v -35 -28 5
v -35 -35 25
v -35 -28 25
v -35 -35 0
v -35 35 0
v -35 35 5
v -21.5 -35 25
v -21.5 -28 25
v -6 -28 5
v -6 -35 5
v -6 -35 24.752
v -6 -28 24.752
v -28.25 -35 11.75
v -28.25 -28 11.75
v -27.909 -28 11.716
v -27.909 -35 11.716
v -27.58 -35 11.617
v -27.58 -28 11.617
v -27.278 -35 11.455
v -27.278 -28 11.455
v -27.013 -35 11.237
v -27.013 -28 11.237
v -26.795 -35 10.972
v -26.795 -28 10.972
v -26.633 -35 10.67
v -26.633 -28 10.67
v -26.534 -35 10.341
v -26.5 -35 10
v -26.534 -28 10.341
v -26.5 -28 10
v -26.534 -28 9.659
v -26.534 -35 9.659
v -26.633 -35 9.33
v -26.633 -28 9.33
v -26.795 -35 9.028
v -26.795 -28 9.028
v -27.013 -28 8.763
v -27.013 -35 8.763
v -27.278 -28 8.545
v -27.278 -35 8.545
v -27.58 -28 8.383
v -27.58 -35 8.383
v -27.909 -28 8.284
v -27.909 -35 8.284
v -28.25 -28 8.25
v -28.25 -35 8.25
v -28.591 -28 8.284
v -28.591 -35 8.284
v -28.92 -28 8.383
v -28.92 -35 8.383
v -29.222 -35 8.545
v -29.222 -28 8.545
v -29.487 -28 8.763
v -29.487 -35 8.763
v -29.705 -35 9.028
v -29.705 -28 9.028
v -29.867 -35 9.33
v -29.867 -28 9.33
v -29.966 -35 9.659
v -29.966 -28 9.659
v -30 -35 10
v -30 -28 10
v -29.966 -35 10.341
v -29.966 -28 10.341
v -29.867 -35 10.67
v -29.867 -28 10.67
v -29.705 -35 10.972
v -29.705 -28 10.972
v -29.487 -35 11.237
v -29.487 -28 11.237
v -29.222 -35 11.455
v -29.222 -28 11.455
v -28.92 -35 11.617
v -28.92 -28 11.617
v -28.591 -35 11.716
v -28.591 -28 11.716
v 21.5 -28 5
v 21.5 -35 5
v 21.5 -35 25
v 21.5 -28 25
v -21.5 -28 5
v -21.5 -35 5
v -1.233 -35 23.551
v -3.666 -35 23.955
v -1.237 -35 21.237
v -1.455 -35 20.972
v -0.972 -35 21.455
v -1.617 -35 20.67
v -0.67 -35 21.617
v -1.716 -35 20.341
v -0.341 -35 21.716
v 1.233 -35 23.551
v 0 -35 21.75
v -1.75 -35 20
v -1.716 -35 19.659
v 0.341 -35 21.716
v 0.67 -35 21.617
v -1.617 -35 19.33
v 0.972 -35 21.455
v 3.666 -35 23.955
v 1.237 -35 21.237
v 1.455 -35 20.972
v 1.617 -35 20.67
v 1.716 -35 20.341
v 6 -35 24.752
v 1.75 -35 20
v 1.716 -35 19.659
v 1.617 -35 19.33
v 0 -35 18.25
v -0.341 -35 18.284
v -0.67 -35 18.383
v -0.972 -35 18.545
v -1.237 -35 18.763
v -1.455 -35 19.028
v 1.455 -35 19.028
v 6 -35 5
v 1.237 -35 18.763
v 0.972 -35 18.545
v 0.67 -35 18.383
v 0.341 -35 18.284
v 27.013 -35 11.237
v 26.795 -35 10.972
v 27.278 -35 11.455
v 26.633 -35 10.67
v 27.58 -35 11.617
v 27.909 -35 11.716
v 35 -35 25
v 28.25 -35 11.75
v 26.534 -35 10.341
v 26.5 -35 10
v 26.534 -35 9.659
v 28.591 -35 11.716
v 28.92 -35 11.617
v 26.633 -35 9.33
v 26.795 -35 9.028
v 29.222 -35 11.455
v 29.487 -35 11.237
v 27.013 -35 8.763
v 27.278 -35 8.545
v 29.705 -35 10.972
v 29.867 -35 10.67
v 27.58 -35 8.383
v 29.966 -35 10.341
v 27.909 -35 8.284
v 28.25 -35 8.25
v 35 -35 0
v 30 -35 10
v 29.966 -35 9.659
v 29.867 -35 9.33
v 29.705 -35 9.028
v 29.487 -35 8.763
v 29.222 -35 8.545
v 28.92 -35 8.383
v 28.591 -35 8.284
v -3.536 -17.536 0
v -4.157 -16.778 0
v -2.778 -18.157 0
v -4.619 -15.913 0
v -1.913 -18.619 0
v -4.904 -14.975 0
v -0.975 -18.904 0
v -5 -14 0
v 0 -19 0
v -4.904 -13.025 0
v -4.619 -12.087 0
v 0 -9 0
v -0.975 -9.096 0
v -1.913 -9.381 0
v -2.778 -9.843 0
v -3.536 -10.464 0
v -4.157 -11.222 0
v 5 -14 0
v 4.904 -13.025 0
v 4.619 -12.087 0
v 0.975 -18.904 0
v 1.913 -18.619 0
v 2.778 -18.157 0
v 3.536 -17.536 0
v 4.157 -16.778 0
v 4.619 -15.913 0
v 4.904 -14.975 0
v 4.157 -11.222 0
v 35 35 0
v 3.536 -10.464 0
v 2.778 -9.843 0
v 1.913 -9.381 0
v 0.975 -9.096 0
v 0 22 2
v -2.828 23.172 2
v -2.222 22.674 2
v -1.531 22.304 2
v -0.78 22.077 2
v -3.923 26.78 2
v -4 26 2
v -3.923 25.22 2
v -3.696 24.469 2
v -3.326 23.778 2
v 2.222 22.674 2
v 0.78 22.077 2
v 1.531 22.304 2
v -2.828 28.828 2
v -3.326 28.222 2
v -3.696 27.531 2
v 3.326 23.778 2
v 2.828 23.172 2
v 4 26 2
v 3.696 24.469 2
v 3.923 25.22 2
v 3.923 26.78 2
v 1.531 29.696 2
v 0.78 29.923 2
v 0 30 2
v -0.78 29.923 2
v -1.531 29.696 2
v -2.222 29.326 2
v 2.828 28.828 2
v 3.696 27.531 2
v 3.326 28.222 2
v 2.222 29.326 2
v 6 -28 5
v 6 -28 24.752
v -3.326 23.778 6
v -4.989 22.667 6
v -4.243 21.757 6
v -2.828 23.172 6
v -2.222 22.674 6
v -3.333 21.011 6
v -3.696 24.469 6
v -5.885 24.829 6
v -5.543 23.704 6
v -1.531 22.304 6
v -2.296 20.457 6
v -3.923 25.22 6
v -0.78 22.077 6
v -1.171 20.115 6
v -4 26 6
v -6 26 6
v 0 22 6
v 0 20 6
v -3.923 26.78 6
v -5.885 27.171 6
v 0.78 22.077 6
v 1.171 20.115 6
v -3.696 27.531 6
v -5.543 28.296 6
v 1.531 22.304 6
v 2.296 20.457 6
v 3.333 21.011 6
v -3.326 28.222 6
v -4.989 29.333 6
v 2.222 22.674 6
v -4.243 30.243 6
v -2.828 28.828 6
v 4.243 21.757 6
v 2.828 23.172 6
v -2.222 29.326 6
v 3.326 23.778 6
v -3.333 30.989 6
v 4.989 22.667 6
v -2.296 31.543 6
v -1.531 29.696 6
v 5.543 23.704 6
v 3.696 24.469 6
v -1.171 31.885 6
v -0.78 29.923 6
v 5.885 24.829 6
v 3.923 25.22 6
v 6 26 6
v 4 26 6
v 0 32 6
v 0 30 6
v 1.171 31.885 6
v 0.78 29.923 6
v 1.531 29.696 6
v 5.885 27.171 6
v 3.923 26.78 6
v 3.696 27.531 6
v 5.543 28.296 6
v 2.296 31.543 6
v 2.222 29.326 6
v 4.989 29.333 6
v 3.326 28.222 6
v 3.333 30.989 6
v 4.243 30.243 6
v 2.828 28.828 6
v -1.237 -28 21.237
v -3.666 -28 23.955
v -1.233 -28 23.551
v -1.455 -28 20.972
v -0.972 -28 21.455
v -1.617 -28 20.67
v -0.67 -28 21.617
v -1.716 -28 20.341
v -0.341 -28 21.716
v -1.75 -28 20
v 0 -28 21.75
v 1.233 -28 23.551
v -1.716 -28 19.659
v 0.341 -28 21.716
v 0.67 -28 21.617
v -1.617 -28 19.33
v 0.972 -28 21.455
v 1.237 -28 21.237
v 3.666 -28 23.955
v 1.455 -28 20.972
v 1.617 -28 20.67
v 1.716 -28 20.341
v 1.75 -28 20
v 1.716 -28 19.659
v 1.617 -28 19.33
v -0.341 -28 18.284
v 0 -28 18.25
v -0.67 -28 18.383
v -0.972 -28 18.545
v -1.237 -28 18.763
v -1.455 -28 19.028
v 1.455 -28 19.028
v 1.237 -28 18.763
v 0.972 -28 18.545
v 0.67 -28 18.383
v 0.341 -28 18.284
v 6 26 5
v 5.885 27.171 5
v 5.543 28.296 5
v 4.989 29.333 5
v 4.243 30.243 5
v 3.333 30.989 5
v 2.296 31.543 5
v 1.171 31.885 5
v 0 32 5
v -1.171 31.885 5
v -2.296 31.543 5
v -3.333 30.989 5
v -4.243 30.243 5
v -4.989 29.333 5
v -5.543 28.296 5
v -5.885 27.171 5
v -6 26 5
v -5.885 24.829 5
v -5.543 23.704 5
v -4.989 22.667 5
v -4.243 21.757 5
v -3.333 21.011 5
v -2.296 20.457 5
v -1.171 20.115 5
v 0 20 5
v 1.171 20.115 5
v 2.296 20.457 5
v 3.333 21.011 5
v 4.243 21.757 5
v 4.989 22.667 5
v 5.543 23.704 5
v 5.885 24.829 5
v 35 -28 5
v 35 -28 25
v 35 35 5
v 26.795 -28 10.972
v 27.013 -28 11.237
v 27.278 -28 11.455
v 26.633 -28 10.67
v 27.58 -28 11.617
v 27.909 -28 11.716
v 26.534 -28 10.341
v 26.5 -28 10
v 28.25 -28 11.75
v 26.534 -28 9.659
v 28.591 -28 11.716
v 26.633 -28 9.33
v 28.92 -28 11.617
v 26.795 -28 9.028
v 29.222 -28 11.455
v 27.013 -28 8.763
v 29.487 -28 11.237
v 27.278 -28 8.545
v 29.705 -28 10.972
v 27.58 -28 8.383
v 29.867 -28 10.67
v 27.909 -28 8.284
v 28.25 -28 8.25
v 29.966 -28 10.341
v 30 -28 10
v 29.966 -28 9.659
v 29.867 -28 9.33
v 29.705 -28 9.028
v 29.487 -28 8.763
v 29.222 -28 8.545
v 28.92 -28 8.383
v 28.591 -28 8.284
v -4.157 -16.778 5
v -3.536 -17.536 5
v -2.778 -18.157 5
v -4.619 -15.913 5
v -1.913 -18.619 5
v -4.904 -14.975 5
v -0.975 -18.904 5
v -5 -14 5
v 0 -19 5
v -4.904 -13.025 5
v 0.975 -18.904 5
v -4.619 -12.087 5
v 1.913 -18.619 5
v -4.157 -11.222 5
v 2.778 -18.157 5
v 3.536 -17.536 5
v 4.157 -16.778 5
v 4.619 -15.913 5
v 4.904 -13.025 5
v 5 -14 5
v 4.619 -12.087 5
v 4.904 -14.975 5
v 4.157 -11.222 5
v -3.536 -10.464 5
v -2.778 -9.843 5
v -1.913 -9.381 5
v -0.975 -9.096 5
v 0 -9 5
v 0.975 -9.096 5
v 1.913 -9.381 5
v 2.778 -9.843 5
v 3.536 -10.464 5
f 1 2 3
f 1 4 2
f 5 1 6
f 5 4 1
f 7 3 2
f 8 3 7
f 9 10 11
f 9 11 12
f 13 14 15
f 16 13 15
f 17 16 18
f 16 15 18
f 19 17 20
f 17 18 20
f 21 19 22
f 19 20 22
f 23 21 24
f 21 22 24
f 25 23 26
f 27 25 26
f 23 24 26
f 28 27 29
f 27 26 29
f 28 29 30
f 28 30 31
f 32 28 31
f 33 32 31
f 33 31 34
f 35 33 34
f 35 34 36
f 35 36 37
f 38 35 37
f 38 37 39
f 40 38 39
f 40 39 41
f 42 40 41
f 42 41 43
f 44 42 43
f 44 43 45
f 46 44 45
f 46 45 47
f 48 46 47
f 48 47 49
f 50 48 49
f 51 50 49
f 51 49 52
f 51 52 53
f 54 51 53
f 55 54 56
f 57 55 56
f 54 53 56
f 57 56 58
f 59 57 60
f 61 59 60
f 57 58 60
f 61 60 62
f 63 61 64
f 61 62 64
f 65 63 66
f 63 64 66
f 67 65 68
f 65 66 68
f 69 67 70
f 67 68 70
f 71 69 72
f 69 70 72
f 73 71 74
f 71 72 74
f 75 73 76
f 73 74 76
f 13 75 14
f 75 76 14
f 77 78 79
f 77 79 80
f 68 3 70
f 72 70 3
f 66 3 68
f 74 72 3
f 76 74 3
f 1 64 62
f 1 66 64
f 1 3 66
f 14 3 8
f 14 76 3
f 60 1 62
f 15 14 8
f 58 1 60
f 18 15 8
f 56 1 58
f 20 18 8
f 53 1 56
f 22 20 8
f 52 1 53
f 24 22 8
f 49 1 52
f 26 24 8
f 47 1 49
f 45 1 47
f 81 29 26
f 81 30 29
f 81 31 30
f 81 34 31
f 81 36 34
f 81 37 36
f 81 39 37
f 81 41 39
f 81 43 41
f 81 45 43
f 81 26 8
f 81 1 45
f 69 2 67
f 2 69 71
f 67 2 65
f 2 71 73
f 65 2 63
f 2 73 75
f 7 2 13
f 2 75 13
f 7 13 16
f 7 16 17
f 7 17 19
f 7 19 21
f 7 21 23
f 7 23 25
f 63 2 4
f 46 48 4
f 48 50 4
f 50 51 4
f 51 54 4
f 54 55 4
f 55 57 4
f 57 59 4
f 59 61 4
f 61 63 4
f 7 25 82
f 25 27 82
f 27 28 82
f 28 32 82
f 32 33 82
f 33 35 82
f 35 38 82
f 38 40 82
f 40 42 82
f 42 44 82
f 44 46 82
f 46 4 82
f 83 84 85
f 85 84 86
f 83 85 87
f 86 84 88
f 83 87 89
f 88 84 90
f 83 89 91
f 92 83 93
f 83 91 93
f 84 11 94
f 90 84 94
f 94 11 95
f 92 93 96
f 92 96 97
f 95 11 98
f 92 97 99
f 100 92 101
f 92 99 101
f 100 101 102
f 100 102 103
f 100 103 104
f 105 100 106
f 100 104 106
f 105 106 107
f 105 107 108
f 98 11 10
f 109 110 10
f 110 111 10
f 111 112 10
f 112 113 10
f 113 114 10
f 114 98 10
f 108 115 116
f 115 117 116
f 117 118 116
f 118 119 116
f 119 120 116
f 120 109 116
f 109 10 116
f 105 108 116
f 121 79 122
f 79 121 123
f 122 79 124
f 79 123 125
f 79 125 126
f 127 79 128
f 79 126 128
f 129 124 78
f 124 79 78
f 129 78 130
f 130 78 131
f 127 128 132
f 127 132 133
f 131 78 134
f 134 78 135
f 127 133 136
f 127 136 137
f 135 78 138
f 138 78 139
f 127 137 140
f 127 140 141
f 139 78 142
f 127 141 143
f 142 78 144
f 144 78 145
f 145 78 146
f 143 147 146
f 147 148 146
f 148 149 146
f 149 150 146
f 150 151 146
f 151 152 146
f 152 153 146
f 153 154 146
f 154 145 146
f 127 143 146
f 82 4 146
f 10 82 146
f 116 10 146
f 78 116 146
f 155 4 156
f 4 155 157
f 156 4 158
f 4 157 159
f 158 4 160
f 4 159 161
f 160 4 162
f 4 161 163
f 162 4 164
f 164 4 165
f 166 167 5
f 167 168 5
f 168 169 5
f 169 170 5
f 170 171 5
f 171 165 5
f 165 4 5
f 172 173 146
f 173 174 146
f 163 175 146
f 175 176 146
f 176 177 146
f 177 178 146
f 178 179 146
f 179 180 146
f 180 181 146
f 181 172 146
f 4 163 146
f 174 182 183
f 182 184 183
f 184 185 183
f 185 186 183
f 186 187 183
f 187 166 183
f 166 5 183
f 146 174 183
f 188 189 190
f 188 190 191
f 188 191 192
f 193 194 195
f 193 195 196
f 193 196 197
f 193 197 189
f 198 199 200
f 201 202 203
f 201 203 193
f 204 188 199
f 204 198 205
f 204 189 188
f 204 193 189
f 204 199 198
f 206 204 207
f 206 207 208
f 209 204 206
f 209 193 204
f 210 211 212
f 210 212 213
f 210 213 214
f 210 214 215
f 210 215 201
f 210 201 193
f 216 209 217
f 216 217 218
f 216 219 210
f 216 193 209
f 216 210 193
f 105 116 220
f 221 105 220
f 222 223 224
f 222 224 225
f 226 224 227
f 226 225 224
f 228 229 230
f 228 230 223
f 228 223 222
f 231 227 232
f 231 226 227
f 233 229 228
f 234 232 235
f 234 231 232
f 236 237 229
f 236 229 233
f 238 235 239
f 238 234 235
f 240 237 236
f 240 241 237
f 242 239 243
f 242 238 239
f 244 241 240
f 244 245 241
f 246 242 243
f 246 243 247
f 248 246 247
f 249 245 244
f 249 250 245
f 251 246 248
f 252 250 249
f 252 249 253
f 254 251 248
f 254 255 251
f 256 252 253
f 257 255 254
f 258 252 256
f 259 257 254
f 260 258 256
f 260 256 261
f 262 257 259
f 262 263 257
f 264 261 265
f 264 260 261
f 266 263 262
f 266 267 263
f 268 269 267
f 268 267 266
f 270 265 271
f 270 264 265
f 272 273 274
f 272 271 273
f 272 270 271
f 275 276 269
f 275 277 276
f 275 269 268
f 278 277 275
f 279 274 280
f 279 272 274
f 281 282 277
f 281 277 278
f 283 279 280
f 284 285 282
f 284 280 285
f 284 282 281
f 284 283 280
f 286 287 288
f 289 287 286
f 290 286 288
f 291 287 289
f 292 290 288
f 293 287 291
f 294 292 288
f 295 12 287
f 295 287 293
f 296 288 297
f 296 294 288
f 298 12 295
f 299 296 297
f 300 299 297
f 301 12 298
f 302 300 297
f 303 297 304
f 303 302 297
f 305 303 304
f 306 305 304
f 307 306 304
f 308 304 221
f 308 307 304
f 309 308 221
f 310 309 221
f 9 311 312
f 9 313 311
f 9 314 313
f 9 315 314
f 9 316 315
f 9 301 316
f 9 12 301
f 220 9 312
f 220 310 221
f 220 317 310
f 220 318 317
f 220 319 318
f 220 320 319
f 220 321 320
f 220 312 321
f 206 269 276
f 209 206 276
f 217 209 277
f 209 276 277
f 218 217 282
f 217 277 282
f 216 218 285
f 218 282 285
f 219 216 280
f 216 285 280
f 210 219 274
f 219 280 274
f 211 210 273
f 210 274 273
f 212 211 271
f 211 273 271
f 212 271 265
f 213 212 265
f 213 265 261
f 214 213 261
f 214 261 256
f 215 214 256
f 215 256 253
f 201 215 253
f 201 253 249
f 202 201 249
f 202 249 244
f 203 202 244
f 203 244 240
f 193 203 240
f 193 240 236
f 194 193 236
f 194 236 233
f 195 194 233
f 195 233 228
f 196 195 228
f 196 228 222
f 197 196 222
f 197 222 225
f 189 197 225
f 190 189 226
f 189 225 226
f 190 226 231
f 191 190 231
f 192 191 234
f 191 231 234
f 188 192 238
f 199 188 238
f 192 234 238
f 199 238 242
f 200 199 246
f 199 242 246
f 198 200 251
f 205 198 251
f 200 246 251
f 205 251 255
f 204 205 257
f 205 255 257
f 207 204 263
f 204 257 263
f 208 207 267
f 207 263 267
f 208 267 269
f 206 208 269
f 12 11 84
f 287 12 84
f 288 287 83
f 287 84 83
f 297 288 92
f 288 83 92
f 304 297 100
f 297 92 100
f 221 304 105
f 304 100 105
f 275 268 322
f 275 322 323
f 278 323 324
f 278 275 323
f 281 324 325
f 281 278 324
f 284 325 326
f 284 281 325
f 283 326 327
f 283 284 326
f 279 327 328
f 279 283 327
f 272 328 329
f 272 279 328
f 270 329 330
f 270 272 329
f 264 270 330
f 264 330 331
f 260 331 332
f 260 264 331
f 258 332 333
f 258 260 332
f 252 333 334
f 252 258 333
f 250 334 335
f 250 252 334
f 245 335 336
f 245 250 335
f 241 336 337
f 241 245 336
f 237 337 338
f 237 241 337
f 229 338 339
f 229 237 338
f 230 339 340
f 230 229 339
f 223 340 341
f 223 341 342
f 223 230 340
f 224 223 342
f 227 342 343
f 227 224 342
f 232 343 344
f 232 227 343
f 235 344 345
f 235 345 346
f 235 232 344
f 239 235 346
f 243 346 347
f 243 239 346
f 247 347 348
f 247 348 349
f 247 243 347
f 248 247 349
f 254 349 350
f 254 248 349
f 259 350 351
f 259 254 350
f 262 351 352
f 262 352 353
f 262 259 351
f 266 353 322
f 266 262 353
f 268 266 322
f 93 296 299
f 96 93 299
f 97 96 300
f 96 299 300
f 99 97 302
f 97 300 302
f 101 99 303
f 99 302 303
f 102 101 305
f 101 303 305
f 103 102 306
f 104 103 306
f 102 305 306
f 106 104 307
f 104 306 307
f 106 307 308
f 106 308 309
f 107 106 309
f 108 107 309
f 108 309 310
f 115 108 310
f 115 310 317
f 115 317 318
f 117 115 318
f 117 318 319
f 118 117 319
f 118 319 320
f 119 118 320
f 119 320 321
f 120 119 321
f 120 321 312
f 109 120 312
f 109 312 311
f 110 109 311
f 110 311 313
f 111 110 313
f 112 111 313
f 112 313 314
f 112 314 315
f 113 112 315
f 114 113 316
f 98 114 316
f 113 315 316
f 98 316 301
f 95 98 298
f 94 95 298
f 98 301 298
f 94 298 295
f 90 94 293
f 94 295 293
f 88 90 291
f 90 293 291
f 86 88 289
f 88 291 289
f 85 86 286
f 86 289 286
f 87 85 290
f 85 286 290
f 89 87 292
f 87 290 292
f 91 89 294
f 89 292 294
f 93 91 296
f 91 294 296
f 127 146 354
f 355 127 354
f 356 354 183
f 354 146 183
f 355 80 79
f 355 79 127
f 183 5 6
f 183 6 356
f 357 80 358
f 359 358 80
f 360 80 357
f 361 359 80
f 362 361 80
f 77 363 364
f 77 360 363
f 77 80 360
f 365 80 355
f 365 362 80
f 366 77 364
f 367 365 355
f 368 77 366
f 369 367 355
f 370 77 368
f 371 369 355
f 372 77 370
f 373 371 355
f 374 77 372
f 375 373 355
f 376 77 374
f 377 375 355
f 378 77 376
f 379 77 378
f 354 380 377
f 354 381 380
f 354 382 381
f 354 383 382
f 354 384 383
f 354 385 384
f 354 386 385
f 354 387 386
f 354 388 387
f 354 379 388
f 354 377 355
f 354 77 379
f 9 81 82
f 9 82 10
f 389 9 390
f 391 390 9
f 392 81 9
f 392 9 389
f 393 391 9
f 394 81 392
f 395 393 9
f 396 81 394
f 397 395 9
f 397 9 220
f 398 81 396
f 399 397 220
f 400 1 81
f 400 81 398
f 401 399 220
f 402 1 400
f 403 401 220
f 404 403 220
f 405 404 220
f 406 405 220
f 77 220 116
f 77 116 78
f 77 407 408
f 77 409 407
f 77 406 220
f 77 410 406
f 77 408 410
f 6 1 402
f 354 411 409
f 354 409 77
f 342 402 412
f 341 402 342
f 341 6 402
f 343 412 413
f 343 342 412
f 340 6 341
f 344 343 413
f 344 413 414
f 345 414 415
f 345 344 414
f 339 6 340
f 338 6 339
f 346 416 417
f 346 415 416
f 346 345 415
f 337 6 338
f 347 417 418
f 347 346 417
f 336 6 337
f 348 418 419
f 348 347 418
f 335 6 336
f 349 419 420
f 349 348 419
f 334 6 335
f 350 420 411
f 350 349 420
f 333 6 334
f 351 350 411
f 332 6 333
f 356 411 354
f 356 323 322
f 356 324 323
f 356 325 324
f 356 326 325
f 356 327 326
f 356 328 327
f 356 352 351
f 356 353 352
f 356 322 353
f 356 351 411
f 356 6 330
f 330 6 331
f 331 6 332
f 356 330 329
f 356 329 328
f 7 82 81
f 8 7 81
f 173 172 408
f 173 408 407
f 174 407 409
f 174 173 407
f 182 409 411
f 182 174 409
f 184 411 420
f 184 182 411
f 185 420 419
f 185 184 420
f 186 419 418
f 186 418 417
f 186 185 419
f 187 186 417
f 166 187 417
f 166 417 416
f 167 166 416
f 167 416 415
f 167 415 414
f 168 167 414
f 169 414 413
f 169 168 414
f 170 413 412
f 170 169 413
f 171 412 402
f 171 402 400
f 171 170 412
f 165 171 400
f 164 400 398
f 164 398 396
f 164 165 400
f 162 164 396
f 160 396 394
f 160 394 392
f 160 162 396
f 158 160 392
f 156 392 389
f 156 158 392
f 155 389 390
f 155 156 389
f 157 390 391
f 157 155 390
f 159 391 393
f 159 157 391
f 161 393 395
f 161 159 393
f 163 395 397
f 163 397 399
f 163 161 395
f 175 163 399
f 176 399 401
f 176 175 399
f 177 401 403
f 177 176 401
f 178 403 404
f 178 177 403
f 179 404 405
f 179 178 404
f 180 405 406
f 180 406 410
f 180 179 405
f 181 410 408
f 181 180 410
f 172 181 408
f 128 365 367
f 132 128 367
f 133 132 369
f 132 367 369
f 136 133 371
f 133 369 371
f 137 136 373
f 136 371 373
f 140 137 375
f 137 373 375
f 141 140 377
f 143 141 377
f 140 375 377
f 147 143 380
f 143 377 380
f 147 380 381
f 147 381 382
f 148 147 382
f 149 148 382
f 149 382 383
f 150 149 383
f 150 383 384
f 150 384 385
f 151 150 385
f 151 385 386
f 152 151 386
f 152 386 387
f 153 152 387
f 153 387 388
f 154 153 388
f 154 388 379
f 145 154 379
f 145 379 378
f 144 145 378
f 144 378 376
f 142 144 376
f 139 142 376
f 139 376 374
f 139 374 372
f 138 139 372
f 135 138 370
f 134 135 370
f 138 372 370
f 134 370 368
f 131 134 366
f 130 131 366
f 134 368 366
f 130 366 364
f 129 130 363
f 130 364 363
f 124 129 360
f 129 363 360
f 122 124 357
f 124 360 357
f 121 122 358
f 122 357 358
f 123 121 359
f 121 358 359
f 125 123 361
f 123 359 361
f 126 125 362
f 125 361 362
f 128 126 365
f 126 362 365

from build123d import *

# Parameters (mm, degrees)
SKETCH1_W           = 70
SKETCH1_H           = 70
SKETCH1_R           = 5
BOSS_EXTRUDE1_DEPTH = 5
SKETCH2_W           = 13.5
SKETCH2_H           = 7
SKETCH2_W_2         = 12
BOSS_EXTRUDE2_DEPTH = 20
SKETCH3_R           = 1.75
CUT_EXTRUDE1_DEPTH  = 20
SKETCH4_R           = 4
CUT_EXTRUDE2_DEPTH  = 3
BOSS_EXTRUDE3_START = 1
SKETCH5_R           = 6
SKETCH5_R_2         = 4
BOSS_EXTRUDE3_DEPTH = 1
SKETCH6_R           = 15
CUT_EXTRUDE3_DEPTH  = 83.158383626


with BuildPart() as part:
    # Sketch1 → Boss-Extrude1 (new body)
    with BuildSketch(Plane.XY):
        Rectangle(SKETCH1_W, SKETCH1_H)
        with Locations((0, -14)):
            Circle(SKETCH1_R, mode=Mode.SUBTRACT)
    extrude(amount=BOSS_EXTRUDE1_DEPTH)

    # Sketch2 → Boss-Extrude2 (add)
    with BuildSketch(Plane.XY.offset(5)):
        with Locations((-28.25, -31.5)):
            Rectangle(SKETCH2_W, SKETCH2_H)
        with Locations((28.25, -31.5)):
            Rectangle(SKETCH2_W, SKETCH2_H)
        with Locations((0, -31.5)):
            Rectangle(SKETCH2_W_2, SKETCH2_H)
    extrude(amount=BOSS_EXTRUDE2_DEPTH)

    # Sketch3 → Cut-Extrude1 (cut)
    with BuildSketch(Plane(origin=(0, -28, 0), x_dir=(1, 0, 0), z_dir=(0, 1, 0))):
        with Locations(Location((-28.25, -10, 0), (0, 0, 270))):
            Circle(SKETCH3_R)
        with Locations(Location((28.25, -10, 0), (0, 0, 270))):
            Circle(SKETCH3_R)
        with Locations(Location((0, -20, 0), (0, 0, 270))):
            Circle(SKETCH3_R)
    extrude(amount=-CUT_EXTRUDE1_DEPTH, mode=Mode.SUBTRACT)

    # Sketch4 → Cut-Extrude2 (cut)
    with BuildSketch(Plane.XY.offset(5)):
        with Locations((0, 26)):
            Circle(SKETCH4_R)
    extrude(amount=-CUT_EXTRUDE2_DEPTH, mode=Mode.SUBTRACT)

    # Sketch5 → Boss-Extrude3 (add)
    with BuildSketch(Plane.XY.offset(5).offset(BOSS_EXTRUDE3_START)):
        with Locations((0, 26)):
            Circle(SKETCH5_R)
        with Locations((0, 26)):
            Circle(SKETCH5_R_2, mode=Mode.SUBTRACT)
    extrude(amount=-BOSS_EXTRUDE3_DEPTH)

    # Sketch6 → Cut-Extrude3 (cut, through all)
    with BuildSketch(Plane.XZ.offset(35)):
        with Locations((0, 38.5)):
            Circle(SKETCH6_R)
    extrude(amount=-CUT_EXTRUDE3_DEPTH, mode=Mode.SUBTRACT)


solid = part.part
